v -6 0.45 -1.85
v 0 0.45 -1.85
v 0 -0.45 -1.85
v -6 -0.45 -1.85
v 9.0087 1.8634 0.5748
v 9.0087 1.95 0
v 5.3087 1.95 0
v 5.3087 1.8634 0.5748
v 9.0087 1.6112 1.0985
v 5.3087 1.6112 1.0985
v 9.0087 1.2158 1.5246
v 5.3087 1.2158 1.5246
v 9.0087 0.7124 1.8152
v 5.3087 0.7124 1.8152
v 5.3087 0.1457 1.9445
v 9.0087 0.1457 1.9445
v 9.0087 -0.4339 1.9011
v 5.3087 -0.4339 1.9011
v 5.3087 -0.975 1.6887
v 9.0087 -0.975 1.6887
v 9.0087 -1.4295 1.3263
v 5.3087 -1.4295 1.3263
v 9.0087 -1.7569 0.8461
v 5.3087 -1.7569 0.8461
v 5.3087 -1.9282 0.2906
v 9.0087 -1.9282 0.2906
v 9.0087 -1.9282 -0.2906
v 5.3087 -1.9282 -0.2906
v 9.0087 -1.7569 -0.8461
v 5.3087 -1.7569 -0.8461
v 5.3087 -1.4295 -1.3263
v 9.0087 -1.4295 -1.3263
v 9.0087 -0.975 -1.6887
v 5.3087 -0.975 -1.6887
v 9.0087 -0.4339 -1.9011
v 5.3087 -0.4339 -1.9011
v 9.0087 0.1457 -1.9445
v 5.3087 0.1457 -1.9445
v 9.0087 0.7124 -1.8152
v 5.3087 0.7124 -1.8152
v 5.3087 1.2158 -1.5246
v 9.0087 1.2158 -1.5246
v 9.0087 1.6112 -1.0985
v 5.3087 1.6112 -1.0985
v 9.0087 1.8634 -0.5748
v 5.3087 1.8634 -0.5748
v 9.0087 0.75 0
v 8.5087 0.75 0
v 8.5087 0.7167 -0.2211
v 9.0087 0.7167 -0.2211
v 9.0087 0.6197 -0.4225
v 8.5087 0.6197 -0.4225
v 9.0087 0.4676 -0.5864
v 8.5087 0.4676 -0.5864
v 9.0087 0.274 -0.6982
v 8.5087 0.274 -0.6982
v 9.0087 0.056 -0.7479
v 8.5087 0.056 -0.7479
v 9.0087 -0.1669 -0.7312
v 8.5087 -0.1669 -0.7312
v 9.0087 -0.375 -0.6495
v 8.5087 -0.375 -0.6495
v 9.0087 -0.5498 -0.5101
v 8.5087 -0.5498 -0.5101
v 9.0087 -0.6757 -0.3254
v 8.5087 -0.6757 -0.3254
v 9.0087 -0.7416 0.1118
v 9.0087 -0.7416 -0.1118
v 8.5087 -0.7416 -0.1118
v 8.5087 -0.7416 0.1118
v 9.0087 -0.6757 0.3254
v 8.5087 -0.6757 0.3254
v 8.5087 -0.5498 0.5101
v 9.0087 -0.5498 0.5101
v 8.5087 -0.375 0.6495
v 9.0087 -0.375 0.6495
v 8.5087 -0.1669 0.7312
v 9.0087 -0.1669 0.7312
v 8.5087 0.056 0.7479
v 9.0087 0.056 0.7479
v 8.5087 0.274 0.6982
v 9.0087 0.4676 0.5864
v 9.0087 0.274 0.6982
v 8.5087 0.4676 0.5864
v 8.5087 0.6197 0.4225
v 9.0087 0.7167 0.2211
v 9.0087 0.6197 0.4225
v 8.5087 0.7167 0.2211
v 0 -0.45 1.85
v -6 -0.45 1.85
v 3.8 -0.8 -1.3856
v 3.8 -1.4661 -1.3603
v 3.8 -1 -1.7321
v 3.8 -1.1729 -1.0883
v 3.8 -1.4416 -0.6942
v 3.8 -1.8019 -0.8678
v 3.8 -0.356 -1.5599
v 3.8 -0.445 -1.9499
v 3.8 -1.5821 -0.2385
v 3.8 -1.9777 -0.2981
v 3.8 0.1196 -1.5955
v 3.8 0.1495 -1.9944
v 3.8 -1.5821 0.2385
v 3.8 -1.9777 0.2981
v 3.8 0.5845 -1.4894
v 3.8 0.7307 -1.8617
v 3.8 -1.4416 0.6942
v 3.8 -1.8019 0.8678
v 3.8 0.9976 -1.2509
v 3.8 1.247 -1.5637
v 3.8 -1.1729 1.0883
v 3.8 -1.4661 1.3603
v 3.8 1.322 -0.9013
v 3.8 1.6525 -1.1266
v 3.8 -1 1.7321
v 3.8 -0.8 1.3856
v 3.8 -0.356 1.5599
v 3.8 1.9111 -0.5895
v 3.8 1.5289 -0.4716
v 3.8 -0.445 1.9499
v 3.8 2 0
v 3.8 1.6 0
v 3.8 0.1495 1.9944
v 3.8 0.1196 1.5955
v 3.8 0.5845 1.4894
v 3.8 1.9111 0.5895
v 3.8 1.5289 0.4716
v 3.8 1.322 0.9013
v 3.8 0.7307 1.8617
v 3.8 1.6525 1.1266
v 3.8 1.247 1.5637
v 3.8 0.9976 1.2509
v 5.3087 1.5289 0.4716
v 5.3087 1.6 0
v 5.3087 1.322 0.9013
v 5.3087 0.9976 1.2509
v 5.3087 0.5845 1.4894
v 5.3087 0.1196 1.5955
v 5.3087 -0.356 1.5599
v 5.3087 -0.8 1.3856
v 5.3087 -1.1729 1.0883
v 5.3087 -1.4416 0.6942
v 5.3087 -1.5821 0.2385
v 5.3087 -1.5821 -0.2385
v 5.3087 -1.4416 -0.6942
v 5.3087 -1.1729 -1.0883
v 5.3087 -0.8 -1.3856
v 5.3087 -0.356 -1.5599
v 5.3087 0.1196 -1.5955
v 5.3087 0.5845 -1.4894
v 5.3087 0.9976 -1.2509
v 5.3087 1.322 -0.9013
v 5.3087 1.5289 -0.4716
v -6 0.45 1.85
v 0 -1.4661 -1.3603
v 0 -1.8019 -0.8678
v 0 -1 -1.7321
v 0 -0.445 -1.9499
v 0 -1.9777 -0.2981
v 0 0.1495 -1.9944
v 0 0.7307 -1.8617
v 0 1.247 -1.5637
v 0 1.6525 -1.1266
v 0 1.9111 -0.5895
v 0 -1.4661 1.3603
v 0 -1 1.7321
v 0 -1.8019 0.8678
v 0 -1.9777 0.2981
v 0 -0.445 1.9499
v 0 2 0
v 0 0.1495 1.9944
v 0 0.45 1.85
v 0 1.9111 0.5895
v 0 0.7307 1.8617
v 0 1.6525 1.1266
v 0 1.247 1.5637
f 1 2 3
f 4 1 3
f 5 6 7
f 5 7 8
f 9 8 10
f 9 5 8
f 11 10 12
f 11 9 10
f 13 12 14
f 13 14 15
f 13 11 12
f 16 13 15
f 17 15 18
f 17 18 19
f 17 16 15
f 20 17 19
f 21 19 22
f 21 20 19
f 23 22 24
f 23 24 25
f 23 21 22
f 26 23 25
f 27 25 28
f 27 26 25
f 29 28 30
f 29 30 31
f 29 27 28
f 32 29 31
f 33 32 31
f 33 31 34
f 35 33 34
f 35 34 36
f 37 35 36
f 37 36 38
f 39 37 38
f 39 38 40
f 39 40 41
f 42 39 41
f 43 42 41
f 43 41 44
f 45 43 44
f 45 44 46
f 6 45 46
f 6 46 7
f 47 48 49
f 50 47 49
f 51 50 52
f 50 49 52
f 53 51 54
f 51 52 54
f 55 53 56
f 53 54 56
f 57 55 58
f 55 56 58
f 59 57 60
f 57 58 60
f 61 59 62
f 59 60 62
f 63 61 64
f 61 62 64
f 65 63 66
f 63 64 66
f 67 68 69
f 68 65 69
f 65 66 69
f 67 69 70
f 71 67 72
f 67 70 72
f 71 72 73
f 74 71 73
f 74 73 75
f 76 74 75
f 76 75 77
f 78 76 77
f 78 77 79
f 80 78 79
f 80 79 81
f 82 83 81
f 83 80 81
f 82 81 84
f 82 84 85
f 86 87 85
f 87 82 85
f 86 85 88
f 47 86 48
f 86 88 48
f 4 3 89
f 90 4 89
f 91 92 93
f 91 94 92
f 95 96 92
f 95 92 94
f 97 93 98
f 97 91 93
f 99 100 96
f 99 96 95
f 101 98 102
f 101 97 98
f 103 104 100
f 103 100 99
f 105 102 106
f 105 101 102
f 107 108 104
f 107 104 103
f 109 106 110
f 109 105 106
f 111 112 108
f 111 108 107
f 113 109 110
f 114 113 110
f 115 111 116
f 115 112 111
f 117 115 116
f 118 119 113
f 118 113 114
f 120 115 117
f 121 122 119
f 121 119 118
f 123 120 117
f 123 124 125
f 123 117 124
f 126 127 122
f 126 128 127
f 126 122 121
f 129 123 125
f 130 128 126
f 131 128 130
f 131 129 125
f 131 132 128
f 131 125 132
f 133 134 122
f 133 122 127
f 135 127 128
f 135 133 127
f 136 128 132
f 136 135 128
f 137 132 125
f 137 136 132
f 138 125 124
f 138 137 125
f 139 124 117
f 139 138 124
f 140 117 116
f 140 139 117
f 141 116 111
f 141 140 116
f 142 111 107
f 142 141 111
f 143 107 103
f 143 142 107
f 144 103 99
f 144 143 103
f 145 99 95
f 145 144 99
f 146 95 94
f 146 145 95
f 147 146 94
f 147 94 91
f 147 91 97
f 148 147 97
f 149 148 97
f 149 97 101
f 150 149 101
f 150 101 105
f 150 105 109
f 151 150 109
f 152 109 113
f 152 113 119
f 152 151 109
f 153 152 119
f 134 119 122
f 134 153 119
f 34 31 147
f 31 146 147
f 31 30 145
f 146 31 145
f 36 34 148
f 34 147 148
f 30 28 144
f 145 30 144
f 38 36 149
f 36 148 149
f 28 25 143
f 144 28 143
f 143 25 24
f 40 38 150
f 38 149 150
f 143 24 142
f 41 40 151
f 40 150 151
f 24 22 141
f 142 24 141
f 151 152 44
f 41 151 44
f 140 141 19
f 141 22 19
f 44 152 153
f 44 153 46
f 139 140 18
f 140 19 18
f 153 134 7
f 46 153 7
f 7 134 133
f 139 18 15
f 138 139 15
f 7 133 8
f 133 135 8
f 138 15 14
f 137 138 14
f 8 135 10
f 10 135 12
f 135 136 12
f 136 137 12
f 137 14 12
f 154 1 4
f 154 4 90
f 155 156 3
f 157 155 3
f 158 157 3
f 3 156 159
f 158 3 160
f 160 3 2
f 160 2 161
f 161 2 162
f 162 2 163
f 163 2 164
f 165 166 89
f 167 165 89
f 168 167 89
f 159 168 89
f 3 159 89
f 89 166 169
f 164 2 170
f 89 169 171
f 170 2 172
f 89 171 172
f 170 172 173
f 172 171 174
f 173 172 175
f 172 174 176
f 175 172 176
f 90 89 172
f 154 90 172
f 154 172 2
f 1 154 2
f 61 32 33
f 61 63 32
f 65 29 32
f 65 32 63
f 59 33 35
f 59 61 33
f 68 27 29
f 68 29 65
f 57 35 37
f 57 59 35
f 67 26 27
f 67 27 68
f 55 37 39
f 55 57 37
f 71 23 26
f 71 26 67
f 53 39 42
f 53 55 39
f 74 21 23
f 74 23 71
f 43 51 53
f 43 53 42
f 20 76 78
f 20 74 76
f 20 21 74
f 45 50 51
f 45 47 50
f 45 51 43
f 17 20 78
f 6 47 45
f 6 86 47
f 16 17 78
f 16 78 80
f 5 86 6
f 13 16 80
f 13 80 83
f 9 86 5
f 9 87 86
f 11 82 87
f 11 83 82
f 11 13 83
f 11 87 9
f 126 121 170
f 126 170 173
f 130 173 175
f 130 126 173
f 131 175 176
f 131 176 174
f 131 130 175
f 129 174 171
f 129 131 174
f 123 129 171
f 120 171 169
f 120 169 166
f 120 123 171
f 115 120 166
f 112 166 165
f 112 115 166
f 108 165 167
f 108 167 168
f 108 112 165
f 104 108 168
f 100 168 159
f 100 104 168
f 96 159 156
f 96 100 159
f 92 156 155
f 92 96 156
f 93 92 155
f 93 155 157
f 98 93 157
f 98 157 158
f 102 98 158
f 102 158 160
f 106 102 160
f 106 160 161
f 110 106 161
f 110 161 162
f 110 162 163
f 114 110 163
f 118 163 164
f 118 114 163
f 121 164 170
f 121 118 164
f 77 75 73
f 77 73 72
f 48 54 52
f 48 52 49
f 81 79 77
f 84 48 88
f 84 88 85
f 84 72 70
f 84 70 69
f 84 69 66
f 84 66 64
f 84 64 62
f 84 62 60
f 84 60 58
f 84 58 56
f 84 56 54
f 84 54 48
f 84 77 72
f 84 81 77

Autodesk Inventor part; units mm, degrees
ref_plane "YZ Plane" through (0, 0, 0) normal (1, 0, 0) x (0, 1, 0)
ref_plane "XZ Plane" through (0, 0, 0) normal (0, 1, 0) x (-1, 0, 0)
ref_plane "XY Plane" through (0, 0, 0) normal (0, 0, 1) x (1, 0, 0)
sketch "Sketch1" plane through (0, 0, 0) normal (0, 0, 1) x (1, 0, 0)
  line L0 (0, 0) -> (9.0087, 0)
  line L1 (0, 0) -> (0, 2)
  line L2 (0, 2) -> (3.8, 2)
  line L3 (3.8, 2) -> (3.8, 1.6)
  line L4 (3.8, 1.6) -> (5.3087, 1.6)
  line L5 (5.3087, 1.6) -> (5.3087, 1.95)
  line L6 (5.3087, 1.95) -> (9.0087, 1.95)
  line L7 (9.0087, 1.95) -> (9.0087, 0.75)
  line L8 (9.0087, 0.75) -> (8.5087, 0.75)
  line L9 (8.5087, 0.75) -> (8.5087, 0)
  dimension "d0" = 4
  dimension "d1" = 3.9
  dimension "d2" = 3.8
  dimension "d3" = 3.7
  dimension "d5" = 3.2
  dimension "d10" = 1.5
  dimension "d11" = 0.5
revolve "Revolution1" add sketch "Sketch1" angle 360 about axis through (0, 0, 0) along (1, 0, 0)
sketch "Sketch2" plane through (0, 0, 0) normal (-1, 0, 0) x (0, 0, 1)
  line L0 (-1.85, -0.45) -> (1.85, -0.45)
  line L1 (1.85, -0.45) -> (1.85, 0.45)
  line L2 (1.85, 0.45) -> (-1.85, 0.45)
  line L3 (-1.85, 0.45) -> (-1.85, -0.45)
  line L4 (-1.85, -0.45) -> (1.85, 0.45) construction
  line L5 (1.85, -0.45) -> (-1.85, 0.45) construction
  point P0 (0, 0)
  dimension "d6" = 3.7
  dimension "d7" = 0.9
extrude "Extrusion1" add sketch "Sketch2" along normal blind 6
properties part number "laser_realpoo_4mm" material "Brass, Soft Yellow"
